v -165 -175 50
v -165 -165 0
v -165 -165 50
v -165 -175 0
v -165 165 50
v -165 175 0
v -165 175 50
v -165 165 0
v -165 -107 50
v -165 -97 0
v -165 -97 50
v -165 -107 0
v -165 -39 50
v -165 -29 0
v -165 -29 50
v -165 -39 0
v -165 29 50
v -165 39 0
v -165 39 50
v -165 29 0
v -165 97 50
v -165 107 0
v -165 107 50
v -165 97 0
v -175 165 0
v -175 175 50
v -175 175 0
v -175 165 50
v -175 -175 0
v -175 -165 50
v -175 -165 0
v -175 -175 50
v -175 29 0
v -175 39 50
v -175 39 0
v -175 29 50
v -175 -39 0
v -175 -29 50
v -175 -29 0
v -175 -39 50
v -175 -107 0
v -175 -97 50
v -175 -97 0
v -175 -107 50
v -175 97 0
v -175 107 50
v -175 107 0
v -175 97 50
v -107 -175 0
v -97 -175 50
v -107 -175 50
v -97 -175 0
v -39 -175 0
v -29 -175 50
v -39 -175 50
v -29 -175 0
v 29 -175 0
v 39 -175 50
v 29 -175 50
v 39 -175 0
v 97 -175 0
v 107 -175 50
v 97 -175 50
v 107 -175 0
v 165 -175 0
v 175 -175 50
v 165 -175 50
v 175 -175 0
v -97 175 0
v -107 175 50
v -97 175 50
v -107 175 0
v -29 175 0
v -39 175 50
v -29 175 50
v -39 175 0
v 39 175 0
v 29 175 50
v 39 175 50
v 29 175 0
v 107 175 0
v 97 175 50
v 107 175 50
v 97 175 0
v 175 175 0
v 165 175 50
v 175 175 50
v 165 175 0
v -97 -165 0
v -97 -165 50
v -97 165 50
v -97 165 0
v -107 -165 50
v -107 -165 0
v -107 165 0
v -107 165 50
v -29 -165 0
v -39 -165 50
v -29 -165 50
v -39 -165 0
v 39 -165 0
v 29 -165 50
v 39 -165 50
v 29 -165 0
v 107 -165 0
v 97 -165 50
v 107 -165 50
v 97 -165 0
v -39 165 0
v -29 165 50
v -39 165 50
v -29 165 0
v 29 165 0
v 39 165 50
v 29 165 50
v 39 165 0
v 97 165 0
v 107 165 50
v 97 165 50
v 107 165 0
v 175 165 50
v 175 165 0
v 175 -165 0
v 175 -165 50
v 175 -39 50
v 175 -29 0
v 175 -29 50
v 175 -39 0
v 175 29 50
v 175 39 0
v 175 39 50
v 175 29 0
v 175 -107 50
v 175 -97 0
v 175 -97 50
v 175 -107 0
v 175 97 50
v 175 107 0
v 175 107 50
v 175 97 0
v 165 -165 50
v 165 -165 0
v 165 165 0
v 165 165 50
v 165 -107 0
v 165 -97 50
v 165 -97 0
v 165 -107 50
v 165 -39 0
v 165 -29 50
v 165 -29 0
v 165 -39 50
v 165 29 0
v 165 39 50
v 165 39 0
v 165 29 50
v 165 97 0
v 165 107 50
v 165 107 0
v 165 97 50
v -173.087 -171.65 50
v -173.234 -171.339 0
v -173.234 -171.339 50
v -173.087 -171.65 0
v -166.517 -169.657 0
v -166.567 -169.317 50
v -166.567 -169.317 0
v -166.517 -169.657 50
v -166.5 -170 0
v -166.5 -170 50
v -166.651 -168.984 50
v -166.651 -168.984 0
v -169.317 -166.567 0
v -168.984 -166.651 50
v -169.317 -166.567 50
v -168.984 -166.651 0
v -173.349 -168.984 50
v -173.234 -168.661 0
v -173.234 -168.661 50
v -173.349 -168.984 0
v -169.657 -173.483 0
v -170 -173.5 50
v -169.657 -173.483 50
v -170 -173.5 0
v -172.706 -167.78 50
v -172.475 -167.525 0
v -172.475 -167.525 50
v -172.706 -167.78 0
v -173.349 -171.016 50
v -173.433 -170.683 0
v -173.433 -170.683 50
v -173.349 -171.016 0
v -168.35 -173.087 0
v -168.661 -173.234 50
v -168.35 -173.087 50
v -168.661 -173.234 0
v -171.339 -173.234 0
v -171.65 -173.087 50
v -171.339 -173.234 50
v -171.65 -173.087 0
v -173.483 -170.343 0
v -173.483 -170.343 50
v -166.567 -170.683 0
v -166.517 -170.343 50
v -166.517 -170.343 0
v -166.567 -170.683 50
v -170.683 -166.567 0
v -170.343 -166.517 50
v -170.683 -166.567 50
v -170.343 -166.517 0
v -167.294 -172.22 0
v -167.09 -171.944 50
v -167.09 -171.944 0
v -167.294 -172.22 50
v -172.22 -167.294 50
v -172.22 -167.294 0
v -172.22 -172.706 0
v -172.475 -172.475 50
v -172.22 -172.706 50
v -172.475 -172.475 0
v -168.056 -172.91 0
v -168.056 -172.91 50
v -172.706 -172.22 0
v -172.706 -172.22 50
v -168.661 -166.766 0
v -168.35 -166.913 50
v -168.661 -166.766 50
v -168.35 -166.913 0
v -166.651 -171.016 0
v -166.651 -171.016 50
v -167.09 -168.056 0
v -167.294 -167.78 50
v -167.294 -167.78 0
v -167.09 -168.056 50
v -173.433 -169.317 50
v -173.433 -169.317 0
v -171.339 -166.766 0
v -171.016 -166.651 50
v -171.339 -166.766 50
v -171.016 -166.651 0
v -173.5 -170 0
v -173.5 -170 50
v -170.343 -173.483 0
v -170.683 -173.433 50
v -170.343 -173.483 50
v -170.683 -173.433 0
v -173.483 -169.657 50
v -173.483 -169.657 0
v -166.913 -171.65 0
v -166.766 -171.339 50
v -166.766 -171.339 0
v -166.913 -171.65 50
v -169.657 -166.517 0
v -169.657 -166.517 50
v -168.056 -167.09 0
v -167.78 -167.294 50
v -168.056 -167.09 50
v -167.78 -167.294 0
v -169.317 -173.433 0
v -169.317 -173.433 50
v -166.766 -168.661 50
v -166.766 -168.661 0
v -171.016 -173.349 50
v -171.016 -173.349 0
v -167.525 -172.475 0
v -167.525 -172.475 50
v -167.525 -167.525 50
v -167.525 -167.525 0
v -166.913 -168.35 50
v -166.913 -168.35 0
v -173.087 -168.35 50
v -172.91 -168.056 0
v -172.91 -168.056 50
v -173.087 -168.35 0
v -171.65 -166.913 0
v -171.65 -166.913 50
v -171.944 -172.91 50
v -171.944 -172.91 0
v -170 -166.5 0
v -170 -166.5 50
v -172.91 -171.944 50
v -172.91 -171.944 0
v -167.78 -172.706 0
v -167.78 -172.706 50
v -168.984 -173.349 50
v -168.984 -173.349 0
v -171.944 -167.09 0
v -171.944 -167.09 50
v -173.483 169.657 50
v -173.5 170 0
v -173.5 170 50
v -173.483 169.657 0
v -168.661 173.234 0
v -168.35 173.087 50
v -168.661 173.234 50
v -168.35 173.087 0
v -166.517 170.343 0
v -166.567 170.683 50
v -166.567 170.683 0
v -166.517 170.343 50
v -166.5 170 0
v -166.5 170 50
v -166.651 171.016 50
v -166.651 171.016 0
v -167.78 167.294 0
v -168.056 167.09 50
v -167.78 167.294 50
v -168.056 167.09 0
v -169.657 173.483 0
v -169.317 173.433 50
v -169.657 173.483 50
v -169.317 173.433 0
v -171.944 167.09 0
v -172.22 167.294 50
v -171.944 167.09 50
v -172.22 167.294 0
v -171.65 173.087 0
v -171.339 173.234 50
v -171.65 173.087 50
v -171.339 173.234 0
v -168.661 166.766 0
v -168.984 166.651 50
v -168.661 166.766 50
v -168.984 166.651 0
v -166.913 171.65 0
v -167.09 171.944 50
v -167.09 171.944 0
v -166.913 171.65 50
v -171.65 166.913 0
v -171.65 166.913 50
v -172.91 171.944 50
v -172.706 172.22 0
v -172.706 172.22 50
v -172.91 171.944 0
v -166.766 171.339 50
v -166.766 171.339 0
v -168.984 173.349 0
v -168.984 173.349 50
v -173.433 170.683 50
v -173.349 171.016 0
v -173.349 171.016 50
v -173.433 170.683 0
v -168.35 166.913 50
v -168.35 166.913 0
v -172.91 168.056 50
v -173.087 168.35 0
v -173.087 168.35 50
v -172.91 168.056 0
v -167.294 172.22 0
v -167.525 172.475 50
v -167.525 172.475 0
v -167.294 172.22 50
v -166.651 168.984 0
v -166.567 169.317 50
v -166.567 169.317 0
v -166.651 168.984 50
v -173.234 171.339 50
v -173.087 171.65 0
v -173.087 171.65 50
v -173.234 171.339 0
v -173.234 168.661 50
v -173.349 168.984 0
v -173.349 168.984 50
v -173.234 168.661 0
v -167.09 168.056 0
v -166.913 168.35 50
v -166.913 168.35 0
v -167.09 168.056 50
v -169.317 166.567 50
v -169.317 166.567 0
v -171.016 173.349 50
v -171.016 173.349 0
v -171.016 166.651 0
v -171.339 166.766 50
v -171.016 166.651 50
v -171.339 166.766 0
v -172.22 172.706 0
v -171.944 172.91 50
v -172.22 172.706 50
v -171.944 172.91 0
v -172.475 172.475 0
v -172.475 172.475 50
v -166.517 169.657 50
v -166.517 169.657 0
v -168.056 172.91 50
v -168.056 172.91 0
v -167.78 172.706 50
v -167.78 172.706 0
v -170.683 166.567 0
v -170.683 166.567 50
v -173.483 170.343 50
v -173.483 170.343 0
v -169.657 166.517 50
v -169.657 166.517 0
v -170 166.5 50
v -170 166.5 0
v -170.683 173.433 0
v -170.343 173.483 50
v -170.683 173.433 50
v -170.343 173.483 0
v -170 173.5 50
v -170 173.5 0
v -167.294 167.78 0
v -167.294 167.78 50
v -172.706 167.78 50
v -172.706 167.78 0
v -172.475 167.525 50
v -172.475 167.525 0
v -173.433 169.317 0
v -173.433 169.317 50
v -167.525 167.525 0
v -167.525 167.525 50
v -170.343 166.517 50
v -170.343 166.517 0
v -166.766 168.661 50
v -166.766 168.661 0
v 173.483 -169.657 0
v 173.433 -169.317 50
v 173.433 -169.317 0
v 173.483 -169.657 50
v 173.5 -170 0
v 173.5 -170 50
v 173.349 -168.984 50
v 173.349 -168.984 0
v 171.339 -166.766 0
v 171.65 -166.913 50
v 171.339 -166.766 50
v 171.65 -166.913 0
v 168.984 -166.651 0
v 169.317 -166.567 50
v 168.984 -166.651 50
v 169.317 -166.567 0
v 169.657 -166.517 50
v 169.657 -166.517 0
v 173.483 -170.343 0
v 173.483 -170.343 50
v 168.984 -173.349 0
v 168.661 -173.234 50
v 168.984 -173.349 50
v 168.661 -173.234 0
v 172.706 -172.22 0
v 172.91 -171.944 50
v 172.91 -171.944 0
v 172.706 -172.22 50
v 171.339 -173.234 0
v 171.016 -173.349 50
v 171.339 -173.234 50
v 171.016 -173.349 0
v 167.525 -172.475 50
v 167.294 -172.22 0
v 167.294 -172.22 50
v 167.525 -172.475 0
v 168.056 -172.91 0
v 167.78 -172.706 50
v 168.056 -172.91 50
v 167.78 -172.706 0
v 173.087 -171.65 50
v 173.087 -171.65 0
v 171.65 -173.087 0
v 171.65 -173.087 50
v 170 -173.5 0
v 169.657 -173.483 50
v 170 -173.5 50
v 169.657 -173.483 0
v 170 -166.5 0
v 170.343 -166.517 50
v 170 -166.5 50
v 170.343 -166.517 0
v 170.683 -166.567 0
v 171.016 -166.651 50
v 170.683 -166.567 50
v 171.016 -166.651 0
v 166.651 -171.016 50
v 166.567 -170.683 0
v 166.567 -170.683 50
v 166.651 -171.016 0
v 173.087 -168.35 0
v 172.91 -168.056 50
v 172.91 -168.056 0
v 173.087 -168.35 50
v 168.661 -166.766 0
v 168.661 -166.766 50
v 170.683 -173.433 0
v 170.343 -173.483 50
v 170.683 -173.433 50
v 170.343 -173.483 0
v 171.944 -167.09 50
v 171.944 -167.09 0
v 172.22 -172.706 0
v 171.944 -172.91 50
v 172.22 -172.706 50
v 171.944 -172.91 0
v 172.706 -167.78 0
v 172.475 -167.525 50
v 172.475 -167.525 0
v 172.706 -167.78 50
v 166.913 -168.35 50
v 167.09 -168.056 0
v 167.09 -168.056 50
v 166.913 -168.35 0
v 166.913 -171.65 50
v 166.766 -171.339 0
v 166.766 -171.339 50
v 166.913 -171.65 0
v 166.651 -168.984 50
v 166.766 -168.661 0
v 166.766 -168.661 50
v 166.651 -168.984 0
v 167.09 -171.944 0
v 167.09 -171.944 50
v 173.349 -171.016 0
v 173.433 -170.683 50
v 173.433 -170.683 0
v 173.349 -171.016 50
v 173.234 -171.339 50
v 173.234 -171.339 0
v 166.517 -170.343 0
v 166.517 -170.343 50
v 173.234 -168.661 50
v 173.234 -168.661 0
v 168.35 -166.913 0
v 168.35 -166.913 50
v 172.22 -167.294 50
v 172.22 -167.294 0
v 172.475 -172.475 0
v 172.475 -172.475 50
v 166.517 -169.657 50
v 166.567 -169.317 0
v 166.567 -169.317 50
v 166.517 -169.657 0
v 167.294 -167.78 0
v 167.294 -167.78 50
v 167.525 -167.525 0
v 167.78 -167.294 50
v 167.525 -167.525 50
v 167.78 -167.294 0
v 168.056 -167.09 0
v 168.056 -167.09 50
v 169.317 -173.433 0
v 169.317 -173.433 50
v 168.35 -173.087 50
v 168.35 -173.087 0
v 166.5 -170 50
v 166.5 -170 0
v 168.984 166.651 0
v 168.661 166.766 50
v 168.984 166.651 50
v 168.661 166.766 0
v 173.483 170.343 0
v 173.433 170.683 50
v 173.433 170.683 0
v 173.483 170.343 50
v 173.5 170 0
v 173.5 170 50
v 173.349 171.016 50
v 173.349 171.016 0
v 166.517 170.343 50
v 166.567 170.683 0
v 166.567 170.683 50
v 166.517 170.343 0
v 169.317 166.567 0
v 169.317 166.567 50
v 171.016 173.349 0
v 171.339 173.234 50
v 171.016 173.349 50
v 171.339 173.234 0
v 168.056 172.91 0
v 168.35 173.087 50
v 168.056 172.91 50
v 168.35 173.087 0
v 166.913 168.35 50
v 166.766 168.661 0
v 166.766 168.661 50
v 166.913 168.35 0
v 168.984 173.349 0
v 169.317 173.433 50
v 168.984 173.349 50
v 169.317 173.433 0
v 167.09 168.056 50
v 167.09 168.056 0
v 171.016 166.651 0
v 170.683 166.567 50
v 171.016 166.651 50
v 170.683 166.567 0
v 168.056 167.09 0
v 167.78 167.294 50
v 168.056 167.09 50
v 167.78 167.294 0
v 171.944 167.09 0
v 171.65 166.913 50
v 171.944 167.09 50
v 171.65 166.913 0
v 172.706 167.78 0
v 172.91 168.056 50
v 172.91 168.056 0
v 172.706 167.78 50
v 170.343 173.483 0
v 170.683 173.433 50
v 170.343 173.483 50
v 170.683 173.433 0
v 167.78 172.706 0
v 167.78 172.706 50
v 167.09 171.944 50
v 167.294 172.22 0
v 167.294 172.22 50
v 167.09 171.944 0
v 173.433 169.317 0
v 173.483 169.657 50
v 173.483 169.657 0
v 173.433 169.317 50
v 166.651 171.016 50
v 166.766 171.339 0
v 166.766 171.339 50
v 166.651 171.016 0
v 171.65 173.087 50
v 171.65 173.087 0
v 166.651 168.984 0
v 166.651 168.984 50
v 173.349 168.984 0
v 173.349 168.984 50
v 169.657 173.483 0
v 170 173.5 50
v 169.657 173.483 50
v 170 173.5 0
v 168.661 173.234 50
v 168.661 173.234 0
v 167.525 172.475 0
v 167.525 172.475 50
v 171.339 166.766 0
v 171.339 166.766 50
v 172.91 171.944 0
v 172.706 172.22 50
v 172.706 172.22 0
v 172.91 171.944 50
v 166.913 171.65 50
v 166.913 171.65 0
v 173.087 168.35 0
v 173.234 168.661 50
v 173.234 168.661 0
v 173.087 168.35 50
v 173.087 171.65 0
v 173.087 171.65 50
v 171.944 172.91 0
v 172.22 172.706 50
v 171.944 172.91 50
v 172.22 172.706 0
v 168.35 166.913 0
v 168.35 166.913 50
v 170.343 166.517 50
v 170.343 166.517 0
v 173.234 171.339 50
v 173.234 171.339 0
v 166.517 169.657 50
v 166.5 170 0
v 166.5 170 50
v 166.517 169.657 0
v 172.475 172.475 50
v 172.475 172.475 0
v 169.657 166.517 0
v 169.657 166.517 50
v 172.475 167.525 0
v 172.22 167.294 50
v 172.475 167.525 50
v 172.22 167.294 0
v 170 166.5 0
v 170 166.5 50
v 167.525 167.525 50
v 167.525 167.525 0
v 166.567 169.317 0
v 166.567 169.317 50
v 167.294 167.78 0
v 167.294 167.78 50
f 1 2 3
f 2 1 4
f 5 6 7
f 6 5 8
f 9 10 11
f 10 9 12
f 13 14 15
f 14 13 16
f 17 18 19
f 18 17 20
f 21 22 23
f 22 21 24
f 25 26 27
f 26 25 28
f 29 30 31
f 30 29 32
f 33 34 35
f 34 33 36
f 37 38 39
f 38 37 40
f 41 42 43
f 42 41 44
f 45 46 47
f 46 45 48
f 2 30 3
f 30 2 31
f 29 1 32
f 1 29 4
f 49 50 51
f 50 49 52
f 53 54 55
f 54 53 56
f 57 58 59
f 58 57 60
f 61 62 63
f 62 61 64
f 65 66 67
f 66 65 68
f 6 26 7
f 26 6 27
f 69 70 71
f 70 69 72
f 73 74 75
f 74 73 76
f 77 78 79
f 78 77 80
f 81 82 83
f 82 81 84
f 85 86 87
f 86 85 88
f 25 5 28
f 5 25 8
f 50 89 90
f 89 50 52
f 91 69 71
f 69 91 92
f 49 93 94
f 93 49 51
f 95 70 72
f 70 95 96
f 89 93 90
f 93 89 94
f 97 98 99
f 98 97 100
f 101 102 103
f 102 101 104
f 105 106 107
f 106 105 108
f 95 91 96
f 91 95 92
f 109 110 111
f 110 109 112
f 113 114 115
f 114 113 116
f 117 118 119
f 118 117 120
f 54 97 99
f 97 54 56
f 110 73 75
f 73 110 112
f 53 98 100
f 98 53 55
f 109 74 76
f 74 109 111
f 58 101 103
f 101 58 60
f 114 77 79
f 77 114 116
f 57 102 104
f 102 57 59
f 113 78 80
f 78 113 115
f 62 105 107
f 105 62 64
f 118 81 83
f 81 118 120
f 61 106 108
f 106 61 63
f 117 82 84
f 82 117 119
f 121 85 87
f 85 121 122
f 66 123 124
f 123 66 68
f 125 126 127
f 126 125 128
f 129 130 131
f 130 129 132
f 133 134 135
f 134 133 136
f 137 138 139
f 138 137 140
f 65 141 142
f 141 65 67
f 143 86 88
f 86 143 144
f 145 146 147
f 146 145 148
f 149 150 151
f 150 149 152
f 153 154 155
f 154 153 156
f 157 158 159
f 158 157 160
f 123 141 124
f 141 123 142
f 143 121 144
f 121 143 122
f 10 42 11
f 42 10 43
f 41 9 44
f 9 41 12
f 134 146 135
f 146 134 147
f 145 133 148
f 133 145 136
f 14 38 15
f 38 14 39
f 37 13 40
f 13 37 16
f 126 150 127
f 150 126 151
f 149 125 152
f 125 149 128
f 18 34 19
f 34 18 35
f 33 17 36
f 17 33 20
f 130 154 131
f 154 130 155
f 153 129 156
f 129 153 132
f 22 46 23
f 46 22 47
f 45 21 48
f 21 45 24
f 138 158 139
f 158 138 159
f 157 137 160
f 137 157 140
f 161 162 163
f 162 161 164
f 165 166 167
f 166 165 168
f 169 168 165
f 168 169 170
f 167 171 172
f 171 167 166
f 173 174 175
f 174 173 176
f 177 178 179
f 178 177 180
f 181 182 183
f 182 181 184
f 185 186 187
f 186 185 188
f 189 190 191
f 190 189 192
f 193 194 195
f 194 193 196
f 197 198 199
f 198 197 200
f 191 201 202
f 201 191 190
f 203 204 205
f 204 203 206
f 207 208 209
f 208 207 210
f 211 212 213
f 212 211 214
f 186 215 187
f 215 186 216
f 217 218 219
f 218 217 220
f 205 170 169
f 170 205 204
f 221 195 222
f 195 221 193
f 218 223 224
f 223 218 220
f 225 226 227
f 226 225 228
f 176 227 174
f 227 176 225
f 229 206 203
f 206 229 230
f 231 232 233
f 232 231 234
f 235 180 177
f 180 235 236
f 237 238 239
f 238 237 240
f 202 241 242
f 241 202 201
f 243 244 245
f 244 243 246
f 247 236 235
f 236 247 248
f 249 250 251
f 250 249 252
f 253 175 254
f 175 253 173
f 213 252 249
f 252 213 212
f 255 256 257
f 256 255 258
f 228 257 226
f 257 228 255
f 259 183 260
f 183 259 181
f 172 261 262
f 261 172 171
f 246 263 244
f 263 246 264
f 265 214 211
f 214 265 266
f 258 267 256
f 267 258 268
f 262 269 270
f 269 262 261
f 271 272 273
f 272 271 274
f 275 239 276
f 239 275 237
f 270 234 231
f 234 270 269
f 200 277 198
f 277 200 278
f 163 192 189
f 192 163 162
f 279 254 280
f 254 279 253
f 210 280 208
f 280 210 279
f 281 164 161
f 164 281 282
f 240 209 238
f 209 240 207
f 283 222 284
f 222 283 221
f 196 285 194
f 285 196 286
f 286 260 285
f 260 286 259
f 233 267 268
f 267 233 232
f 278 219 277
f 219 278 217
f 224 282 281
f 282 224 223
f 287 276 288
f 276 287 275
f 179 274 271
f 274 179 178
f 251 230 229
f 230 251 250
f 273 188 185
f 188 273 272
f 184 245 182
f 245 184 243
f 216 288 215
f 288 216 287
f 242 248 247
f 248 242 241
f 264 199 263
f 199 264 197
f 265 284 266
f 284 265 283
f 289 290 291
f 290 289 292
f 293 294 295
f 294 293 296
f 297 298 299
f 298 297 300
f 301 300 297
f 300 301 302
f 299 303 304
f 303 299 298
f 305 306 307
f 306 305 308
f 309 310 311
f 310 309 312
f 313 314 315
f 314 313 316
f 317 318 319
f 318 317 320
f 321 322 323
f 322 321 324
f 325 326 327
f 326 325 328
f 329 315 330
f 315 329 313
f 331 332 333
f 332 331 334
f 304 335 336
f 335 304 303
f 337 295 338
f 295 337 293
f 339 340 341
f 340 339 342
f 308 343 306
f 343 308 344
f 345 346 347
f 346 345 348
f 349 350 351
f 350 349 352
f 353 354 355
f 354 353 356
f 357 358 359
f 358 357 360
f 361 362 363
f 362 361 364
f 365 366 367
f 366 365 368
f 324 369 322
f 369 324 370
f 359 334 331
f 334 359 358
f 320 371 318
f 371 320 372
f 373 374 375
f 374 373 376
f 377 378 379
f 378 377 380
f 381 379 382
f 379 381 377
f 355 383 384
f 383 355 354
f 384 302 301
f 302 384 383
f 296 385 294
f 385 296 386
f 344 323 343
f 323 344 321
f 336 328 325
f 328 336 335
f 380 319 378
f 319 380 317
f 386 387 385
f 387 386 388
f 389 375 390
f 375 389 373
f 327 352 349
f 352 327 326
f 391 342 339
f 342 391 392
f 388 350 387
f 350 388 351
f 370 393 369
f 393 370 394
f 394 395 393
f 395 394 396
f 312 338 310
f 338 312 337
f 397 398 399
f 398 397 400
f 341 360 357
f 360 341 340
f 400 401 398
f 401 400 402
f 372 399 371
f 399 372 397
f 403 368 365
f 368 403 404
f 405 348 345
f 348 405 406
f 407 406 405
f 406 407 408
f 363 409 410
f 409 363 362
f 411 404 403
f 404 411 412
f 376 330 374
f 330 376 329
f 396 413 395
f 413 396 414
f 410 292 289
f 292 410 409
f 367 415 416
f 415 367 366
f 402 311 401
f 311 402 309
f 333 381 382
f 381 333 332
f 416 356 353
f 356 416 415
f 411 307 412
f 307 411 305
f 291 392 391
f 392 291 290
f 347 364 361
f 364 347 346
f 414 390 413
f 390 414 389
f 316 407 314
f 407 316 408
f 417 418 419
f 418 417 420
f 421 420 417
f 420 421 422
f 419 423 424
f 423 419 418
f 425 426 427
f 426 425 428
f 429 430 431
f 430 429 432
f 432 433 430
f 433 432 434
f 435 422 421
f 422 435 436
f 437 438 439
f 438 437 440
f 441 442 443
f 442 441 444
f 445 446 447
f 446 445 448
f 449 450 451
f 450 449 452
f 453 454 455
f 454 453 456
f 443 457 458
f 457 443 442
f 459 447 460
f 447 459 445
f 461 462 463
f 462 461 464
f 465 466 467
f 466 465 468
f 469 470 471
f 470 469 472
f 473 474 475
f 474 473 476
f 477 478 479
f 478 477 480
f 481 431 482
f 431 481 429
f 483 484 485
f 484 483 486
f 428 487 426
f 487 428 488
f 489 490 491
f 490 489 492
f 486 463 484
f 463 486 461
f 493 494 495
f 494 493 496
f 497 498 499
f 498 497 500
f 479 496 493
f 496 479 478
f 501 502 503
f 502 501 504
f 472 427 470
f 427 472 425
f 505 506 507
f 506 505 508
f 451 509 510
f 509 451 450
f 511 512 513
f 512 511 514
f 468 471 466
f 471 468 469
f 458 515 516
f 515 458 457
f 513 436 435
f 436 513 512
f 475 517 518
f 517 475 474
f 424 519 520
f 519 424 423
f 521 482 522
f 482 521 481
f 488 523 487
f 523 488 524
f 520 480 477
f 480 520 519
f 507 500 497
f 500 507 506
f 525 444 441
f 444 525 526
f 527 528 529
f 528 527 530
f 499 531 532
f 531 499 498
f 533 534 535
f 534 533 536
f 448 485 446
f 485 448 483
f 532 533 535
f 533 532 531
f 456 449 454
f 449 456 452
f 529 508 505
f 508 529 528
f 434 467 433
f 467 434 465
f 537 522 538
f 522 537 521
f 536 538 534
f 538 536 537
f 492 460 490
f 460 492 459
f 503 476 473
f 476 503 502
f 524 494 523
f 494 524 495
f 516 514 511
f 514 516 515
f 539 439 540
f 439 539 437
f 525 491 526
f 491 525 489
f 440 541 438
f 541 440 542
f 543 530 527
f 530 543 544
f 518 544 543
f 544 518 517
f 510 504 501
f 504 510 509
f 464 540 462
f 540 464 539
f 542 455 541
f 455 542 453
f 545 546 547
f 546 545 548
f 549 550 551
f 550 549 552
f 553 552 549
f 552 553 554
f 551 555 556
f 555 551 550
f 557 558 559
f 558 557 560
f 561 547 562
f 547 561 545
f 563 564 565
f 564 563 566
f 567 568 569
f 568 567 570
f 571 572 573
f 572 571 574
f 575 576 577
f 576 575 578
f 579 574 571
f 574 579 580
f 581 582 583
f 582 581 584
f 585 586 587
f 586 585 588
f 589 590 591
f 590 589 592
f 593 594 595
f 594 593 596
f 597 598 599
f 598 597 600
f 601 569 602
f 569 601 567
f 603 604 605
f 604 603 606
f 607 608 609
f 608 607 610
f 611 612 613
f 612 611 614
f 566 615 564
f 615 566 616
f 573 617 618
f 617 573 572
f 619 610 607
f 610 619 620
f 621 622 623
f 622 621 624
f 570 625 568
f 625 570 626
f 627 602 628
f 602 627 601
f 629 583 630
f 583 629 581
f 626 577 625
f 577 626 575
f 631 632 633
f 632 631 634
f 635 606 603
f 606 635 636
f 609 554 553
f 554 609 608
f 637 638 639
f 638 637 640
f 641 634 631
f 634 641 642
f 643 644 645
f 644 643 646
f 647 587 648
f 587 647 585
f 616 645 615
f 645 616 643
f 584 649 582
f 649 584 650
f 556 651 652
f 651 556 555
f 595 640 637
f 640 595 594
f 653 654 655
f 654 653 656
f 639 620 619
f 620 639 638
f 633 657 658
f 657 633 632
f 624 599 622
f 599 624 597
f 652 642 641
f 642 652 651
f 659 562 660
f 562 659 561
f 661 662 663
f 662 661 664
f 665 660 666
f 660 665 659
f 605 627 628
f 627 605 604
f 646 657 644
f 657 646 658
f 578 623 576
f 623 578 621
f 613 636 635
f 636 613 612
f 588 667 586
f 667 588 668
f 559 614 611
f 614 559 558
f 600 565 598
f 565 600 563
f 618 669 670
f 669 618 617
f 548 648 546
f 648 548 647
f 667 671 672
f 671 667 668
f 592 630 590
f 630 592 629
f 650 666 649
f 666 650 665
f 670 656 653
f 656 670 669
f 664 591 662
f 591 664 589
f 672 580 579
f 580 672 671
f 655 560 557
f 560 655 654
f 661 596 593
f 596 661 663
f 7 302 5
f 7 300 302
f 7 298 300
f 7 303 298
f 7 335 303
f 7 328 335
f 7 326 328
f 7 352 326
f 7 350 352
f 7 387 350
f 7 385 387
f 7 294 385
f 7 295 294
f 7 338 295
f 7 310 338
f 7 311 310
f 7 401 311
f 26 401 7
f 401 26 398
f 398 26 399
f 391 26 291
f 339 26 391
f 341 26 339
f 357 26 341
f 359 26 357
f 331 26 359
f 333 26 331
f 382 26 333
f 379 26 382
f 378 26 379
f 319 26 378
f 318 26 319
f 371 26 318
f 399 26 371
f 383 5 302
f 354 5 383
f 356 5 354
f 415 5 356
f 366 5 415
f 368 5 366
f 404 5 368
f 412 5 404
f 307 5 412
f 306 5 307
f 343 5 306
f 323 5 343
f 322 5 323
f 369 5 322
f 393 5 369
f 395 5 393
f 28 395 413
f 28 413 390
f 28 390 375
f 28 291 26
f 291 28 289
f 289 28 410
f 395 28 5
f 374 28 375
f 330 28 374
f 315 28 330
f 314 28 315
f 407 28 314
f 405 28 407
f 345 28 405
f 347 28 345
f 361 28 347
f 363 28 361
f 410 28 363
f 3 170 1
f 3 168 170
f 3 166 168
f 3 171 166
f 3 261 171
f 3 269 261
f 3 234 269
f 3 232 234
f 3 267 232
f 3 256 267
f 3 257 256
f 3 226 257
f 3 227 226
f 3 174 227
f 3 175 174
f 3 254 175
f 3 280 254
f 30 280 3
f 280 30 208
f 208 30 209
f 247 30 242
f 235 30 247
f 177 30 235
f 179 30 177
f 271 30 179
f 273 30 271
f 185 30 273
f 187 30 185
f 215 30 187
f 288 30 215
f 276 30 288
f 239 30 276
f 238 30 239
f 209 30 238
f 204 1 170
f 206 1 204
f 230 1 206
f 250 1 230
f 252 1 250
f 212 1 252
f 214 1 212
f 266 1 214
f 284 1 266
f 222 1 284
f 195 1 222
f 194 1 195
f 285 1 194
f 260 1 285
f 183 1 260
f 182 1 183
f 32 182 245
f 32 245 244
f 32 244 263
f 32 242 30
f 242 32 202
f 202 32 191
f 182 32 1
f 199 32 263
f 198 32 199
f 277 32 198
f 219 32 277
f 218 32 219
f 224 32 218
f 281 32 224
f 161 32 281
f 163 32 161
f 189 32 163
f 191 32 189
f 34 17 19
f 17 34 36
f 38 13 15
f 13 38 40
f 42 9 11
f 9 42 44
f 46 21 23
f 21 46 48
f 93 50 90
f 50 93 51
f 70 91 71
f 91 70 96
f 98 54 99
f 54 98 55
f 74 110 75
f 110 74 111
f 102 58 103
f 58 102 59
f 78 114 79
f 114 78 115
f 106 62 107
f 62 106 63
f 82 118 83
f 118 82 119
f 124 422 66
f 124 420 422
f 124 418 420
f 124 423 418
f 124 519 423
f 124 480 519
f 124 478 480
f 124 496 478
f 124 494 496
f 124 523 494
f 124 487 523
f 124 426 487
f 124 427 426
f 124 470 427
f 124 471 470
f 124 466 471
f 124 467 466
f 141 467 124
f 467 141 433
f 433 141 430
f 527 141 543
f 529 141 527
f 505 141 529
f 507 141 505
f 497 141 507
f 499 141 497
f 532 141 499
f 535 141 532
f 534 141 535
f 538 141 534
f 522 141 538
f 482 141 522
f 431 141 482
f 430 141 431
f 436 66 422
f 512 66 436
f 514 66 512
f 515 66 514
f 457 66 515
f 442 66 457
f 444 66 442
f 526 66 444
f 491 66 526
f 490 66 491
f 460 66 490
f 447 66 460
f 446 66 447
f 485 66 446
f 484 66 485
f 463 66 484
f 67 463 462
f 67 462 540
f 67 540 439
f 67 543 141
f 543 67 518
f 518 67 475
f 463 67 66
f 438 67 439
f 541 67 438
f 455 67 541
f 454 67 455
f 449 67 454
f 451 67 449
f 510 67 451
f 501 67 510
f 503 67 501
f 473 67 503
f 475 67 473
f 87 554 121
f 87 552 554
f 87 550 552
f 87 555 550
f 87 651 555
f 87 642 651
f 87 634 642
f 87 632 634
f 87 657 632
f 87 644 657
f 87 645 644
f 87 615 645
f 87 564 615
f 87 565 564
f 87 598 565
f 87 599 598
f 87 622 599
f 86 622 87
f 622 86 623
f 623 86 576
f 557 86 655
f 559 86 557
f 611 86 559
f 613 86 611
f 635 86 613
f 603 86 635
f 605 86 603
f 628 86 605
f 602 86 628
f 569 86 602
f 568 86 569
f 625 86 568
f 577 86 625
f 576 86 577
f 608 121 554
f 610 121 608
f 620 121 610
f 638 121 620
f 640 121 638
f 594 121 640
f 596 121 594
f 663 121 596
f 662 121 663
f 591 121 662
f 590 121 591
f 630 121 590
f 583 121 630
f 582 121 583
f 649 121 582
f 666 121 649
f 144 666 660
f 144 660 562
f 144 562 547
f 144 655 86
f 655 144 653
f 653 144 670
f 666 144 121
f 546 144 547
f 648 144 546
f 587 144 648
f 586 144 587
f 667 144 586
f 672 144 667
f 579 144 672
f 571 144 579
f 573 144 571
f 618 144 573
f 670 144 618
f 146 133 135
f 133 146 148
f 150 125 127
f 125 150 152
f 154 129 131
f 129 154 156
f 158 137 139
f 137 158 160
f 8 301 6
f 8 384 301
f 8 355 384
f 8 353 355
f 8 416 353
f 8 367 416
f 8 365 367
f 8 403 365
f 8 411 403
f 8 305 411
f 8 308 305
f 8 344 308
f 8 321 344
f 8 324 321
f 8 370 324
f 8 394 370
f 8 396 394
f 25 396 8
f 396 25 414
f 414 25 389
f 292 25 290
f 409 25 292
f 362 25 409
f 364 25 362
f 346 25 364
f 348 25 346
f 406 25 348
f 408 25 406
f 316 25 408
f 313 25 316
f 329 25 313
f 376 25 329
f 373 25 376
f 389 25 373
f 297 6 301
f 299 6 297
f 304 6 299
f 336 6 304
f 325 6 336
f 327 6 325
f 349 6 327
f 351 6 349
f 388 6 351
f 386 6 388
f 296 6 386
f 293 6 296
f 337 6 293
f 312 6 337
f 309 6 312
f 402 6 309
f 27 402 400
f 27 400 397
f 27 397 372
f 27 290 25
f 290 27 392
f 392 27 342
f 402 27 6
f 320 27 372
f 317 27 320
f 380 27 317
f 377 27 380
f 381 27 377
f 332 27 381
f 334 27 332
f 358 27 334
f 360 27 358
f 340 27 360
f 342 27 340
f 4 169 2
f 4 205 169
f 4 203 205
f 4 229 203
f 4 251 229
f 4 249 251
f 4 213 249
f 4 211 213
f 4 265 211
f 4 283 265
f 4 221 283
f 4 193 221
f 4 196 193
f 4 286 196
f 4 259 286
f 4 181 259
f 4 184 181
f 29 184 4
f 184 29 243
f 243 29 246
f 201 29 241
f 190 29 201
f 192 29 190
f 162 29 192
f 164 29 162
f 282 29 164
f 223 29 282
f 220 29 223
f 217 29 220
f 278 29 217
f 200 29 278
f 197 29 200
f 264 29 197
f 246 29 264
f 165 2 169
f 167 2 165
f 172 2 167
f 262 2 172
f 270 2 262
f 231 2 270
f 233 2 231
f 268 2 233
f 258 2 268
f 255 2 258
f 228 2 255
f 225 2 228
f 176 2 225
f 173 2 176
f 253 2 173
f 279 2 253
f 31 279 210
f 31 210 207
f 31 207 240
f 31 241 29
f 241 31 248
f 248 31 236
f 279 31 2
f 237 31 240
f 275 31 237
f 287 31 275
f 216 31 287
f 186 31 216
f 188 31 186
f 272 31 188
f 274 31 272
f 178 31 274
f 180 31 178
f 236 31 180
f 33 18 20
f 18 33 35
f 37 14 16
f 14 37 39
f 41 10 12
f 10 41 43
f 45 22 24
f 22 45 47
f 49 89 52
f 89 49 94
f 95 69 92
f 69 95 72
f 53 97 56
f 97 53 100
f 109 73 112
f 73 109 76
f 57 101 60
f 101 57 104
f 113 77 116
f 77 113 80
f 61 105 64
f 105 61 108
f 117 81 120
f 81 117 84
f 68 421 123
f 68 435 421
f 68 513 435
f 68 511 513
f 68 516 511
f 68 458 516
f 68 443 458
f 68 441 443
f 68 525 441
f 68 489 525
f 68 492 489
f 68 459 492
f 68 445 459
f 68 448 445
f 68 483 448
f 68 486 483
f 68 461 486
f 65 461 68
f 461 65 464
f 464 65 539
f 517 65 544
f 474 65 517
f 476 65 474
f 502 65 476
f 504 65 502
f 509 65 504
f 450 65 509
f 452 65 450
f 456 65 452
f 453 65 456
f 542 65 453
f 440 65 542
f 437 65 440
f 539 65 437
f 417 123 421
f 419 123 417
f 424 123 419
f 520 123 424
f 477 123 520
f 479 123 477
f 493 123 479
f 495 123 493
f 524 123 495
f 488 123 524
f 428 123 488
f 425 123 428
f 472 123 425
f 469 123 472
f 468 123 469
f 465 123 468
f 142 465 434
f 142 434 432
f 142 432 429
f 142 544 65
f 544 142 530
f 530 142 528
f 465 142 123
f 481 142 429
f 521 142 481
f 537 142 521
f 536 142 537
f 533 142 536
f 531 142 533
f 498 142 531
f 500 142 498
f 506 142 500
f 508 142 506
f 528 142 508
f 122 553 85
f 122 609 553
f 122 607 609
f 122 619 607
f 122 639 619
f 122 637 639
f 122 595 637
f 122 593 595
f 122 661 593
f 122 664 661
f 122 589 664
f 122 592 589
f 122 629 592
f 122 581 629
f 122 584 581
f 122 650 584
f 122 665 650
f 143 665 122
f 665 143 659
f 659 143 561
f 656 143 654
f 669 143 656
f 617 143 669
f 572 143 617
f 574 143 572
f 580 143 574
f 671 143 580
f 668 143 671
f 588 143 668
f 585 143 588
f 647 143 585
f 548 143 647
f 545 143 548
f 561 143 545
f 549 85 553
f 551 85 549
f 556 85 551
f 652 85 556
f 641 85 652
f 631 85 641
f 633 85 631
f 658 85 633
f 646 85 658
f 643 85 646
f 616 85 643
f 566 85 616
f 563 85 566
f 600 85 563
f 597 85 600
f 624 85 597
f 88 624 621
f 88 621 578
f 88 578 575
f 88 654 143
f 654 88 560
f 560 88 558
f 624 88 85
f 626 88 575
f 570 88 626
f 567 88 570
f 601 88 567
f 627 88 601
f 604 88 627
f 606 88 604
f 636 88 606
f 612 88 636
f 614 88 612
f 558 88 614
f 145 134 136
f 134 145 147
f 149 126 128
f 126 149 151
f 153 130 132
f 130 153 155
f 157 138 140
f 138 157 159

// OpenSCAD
// Cage slice - index 3
bar = 10;
outer = 350;
half = outer / 2;
height = 700;

N_xy = 6;
N_z  = 11;

x_spacing = (outer - bar) / (N_xy - 1);
z_spacing = (height - bar) / (N_z  - 1);

xs = [ for (i = [0 : N_xy - 1]) (-half + bar/2 + i * x_spacing) ];
ys = xs;

zs = [ for (k = [0 : N_z - 1]) (bar/2 + k * z_spacing) ];

$fn = 64;

module cage_bars() {
    union() {
        // Vertical bars on front and back faces
        for (xv = xs) {
            translate([xv, -half + bar/2, height/2])
                cube([bar, bar, height], center = true);
            translate([xv,  half - bar/2, height/2])
                cube([bar, bar, height], center = true);
        }

        // Vertical bars on left and right faces
        for (yv = ys) {
            translate([-half + bar/2, yv, height/2])
                cube([bar, bar, height], center = true);
            translate([ half - bar/2, yv, height/2])
                cube([bar, bar, height], center = true);
        }

        // Horizontal x-bars on front and back faces
        for (zv = zs) {
            translate([0, -half + bar/2, zv])
                cube([outer, bar, bar], center = true);
            translate([0,  half - bar/2, zv])
                cube([outer, bar, bar], center = true);
        }

        // Horizontal y-bars on left and right faces
        for (zv = zs) {
            translate([-half + bar/2, 0, zv])
                cube([bar, outer, bar], center = true);
            translate([ half - bar/2, 0, zv])
                cube([bar, outer, bar], center = true);
        }

        // Floor and ceiling extra x-bars at all y positions
        z_floor = bar/2;
        z_ceil  = height - bar/2;
        for (yv = ys) {
            translate([0, yv, z_floor])
                cube([outer, bar, bar], center = true);
            translate([0, yv, z_ceil])
                cube([outer, bar, bar], center = true);
        }

        // Floor and ceiling extra y-bars at all x positions
        for (xv = xs) {
            translate([xv, 0, z_floor])
                cube([bar, outer, bar], center = true);
            translate([xv, 0, z_ceil])
                cube([bar, outer, bar], center = true);
        }
    }
}

module corner_holes() {
    hole_d = 7;
    for (sx = [-1, 1])
        for (sy = [-1, 1])
            translate([sx * (half - bar/2), sy * (half - bar/2), height/2])
                cylinder(h = height + 2, d = hole_d, center = true);
}

module cage_full() {
    difference() {
        cage_bars();
        corner_holes();
    }
}

slice_index = 3;
slice_height = 50;

module cage_slice() {
    translate([0, 0, -slice_index * slice_height]) {
        intersection() {
            cage_full();
            translate([0, 0, slice_index * slice_height + slice_height/2])
                cube([outer + 20, outer + 20, slice_height], center = true);
        }
    }
}

cage_slice();
